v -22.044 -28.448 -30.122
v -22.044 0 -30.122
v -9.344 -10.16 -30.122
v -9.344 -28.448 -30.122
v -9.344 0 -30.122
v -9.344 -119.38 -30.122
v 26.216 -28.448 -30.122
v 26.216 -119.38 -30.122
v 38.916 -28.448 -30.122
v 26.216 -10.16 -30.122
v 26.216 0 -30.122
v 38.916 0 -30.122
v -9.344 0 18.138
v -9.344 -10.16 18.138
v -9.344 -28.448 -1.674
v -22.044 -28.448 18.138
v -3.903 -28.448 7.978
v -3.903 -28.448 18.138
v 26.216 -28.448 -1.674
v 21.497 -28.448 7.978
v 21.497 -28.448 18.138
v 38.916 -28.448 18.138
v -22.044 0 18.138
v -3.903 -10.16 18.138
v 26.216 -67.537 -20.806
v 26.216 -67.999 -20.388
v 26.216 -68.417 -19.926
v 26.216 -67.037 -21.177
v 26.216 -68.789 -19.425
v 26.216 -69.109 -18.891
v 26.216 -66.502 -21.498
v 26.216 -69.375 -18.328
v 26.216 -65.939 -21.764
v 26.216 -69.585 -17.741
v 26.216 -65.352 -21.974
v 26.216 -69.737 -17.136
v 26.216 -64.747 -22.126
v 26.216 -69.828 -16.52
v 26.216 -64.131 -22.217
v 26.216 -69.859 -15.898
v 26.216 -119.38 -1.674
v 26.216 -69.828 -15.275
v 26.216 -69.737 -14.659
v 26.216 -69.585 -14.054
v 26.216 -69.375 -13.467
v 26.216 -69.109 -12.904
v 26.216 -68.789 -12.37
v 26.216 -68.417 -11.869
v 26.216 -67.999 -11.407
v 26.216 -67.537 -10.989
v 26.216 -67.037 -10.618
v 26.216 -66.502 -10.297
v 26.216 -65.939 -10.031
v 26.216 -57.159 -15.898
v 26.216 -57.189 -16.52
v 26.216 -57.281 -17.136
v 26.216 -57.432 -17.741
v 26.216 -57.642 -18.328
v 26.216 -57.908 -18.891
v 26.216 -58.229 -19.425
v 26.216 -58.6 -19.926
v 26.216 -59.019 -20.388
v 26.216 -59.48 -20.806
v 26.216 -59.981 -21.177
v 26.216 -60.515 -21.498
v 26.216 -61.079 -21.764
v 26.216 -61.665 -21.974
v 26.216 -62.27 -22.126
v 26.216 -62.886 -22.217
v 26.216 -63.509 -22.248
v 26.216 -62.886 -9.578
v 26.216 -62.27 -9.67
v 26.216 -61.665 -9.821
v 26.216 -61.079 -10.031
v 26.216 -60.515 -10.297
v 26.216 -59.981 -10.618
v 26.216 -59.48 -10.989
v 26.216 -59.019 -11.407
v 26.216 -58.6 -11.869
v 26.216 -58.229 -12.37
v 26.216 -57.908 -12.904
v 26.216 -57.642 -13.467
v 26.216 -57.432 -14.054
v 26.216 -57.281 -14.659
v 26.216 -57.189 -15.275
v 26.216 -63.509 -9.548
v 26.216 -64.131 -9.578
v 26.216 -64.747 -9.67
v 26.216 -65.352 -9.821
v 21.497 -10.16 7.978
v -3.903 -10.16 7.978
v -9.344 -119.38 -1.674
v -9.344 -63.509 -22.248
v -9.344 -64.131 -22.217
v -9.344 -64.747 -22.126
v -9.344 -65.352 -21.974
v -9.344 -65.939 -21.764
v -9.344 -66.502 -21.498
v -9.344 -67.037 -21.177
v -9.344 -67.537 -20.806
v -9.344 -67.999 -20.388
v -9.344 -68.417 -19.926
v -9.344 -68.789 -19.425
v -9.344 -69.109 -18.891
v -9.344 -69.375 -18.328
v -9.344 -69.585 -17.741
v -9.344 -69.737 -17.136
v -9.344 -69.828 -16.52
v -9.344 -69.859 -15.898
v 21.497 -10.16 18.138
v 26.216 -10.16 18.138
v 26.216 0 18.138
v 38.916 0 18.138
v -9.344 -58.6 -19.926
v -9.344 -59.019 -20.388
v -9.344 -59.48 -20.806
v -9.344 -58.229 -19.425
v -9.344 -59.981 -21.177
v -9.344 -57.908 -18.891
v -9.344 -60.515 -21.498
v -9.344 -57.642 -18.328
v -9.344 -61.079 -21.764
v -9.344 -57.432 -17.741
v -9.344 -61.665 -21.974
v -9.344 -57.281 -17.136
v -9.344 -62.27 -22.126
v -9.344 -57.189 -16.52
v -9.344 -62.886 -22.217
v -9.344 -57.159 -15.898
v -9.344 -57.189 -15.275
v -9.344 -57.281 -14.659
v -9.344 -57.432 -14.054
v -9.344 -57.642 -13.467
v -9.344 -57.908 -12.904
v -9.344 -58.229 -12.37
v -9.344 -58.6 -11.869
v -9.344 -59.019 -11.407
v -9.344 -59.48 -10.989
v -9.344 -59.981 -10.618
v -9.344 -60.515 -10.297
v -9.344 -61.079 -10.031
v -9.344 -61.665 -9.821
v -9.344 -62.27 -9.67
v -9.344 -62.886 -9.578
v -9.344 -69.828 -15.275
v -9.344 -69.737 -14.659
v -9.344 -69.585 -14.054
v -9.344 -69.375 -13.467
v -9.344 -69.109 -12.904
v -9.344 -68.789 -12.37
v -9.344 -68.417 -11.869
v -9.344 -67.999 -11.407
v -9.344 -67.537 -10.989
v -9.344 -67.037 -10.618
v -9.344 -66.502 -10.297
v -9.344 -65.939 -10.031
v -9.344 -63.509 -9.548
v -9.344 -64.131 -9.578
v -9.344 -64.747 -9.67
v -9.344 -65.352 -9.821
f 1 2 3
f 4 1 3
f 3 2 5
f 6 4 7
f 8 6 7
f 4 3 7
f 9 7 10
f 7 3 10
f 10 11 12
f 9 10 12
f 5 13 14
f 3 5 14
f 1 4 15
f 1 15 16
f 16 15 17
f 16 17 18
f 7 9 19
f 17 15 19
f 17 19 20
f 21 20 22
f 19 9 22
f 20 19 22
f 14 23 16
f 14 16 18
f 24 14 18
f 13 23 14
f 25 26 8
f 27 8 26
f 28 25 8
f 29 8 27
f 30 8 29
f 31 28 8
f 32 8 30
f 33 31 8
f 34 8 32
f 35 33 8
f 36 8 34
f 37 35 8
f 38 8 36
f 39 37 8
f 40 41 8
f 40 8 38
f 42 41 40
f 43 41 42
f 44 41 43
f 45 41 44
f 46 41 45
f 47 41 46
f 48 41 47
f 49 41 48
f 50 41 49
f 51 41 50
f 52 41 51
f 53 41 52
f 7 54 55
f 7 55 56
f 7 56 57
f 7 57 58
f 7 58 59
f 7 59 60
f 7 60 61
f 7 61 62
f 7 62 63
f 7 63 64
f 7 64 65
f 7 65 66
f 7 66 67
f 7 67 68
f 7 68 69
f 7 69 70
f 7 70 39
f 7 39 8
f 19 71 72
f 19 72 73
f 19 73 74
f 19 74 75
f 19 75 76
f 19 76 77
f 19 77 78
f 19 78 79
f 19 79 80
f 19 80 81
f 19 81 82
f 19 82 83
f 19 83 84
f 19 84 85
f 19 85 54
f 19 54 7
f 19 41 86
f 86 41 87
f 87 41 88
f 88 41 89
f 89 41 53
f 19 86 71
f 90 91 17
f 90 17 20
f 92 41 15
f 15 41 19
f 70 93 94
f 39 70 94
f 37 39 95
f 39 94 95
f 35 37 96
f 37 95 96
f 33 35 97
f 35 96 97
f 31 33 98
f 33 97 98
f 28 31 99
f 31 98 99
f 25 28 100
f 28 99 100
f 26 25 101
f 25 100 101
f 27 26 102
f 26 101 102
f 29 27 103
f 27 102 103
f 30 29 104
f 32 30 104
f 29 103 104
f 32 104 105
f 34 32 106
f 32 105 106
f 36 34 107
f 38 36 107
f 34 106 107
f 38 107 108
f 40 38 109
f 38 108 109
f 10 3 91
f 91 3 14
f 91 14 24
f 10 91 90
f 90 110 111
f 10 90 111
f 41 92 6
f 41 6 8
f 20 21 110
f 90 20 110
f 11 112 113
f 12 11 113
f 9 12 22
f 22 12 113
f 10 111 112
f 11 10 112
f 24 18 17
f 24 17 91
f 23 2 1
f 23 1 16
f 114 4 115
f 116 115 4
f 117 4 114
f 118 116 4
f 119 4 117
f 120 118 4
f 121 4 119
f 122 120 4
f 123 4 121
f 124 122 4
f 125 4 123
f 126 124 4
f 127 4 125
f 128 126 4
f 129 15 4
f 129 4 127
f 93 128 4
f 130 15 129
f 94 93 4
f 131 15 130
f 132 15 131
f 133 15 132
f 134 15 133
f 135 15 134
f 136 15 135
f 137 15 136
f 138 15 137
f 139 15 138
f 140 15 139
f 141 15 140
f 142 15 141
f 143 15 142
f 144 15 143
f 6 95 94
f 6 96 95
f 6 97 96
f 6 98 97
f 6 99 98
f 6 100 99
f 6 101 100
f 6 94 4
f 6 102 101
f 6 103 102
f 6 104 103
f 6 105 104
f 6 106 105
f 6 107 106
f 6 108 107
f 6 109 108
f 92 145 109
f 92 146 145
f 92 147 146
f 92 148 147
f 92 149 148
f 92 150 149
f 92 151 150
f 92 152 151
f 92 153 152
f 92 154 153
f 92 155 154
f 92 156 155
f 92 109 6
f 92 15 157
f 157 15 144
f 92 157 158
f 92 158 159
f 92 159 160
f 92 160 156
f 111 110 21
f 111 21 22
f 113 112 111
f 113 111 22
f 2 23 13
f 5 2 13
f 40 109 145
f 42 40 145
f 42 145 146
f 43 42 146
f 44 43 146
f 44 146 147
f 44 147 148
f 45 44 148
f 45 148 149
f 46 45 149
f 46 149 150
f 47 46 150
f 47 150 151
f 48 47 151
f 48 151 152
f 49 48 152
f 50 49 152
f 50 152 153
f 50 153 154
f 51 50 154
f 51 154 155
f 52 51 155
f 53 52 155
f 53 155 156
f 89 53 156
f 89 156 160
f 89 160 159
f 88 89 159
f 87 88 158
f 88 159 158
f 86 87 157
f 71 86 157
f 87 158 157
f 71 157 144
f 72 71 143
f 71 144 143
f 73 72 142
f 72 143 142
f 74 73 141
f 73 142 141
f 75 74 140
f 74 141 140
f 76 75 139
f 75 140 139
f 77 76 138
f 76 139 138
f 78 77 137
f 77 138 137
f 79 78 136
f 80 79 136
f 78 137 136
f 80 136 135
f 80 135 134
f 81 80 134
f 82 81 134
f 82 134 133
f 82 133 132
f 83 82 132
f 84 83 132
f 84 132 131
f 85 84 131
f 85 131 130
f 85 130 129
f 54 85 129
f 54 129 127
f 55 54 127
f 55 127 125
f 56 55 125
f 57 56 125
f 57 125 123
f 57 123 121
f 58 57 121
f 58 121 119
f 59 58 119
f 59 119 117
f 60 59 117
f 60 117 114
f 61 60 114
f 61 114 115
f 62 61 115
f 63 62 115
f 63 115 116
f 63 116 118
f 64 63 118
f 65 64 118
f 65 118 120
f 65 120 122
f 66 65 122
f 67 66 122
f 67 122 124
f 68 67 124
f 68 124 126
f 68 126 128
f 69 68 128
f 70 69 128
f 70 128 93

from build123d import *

# Parameters (mm, degrees)
F0_W      = 60.96
F0_H      = 48.26
F1_DEPTH  = 119.38
F3_DEPTH  = 130.81
F2_W      = 25.4
F2_H      = 18.288
F4_DEPTH  = 10.16
F6_DEPTH  = 12.7
F7_W      = 90.932
F7_H      = 28.448
F8_DEPTH  = 12.7
F9_W      = 90.932
F9_H      = 19.812
F10_DEPTH = 84.328
F12_DEPTH = 131.064


with BuildPart() as f1:
    # F0 (on Front) → F1 (new body)
    with BuildSketch(Plane.XZ):
        with Locations((8.435591, -5.991532)):
            Rectangle(F0_W, F0_H)
    extrude(amount=F1_DEPTH)

    # F2 (on face) → F3 (cut)
    with BuildSketch(Plane.XY.offset(18.138468)):
        Polygon((26.215591, 0), (-9.344409, 0), (-9.344409, -10.16), (-3.902869, -10.16), (21.497131, -10.16), (26.215591, -10.16), align=None)
    extrude(amount=-F3_DEPTH, mode=Mode.SUBTRACT)

    # F2 (on face) → F4 (cut)
    with BuildSketch(Plane.XY.offset(18.138468)):
        with Locations((8.797131, -19.304)):
            Rectangle(F2_W, F2_H)
    extrude(amount=-F4_DEPTH, mode=Mode.SUBTRACT)

    # F5 (on face) → F6 (cut)
    with BuildSketch(Plane(origin=(-22.044409, 0, 0), x_dir=(0, -1, 0), z_dir=(-1, 0, 0))):
        Polygon((28.448, -1.673532), (28.448, -30.121532), (142.968658, -30.121532), (142.526776, 0), align=None)
    extrude(amount=-F6_DEPTH, mode=Mode.SUBTRACT)

    # F7 (on face) → F8 (cut)
    with BuildSketch(Plane.YZ.offset(38.915591)):
        with Locations((-73.914, -15.897532)):
            Rectangle(F7_W, F7_H)
    extrude(amount=-F8_DEPTH, mode=Mode.SUBTRACT)

    # F9 (on face) → F10 (cut)
    with BuildSketch(Plane.YZ.offset(38.915591)):
        with Locations((-73.914, 8.232468)):
            Rectangle(F9_W, F9_H)
    extrude(amount=-F10_DEPTH, mode=Mode.SUBTRACT)

    # F11 (on face) → F12 (cut)
    with BuildSketch(Plane(origin=(-9.344409, 0, 0), x_dir=(0, -1, 0), z_dir=(-1, 0, 0))):
        with BuildLine():
            ThreePointArc((63.508675, -22.247532), (67.998803, -20.387661), (69.858675, -15.897532))
            ThreePointArc((69.858675, -15.897532), (59.018546, -11.407404), (63.508675, -22.247532))
        make_face()
    extrude(amount=-F12_DEPTH, mode=Mode.SUBTRACT)


solid = f1.part
